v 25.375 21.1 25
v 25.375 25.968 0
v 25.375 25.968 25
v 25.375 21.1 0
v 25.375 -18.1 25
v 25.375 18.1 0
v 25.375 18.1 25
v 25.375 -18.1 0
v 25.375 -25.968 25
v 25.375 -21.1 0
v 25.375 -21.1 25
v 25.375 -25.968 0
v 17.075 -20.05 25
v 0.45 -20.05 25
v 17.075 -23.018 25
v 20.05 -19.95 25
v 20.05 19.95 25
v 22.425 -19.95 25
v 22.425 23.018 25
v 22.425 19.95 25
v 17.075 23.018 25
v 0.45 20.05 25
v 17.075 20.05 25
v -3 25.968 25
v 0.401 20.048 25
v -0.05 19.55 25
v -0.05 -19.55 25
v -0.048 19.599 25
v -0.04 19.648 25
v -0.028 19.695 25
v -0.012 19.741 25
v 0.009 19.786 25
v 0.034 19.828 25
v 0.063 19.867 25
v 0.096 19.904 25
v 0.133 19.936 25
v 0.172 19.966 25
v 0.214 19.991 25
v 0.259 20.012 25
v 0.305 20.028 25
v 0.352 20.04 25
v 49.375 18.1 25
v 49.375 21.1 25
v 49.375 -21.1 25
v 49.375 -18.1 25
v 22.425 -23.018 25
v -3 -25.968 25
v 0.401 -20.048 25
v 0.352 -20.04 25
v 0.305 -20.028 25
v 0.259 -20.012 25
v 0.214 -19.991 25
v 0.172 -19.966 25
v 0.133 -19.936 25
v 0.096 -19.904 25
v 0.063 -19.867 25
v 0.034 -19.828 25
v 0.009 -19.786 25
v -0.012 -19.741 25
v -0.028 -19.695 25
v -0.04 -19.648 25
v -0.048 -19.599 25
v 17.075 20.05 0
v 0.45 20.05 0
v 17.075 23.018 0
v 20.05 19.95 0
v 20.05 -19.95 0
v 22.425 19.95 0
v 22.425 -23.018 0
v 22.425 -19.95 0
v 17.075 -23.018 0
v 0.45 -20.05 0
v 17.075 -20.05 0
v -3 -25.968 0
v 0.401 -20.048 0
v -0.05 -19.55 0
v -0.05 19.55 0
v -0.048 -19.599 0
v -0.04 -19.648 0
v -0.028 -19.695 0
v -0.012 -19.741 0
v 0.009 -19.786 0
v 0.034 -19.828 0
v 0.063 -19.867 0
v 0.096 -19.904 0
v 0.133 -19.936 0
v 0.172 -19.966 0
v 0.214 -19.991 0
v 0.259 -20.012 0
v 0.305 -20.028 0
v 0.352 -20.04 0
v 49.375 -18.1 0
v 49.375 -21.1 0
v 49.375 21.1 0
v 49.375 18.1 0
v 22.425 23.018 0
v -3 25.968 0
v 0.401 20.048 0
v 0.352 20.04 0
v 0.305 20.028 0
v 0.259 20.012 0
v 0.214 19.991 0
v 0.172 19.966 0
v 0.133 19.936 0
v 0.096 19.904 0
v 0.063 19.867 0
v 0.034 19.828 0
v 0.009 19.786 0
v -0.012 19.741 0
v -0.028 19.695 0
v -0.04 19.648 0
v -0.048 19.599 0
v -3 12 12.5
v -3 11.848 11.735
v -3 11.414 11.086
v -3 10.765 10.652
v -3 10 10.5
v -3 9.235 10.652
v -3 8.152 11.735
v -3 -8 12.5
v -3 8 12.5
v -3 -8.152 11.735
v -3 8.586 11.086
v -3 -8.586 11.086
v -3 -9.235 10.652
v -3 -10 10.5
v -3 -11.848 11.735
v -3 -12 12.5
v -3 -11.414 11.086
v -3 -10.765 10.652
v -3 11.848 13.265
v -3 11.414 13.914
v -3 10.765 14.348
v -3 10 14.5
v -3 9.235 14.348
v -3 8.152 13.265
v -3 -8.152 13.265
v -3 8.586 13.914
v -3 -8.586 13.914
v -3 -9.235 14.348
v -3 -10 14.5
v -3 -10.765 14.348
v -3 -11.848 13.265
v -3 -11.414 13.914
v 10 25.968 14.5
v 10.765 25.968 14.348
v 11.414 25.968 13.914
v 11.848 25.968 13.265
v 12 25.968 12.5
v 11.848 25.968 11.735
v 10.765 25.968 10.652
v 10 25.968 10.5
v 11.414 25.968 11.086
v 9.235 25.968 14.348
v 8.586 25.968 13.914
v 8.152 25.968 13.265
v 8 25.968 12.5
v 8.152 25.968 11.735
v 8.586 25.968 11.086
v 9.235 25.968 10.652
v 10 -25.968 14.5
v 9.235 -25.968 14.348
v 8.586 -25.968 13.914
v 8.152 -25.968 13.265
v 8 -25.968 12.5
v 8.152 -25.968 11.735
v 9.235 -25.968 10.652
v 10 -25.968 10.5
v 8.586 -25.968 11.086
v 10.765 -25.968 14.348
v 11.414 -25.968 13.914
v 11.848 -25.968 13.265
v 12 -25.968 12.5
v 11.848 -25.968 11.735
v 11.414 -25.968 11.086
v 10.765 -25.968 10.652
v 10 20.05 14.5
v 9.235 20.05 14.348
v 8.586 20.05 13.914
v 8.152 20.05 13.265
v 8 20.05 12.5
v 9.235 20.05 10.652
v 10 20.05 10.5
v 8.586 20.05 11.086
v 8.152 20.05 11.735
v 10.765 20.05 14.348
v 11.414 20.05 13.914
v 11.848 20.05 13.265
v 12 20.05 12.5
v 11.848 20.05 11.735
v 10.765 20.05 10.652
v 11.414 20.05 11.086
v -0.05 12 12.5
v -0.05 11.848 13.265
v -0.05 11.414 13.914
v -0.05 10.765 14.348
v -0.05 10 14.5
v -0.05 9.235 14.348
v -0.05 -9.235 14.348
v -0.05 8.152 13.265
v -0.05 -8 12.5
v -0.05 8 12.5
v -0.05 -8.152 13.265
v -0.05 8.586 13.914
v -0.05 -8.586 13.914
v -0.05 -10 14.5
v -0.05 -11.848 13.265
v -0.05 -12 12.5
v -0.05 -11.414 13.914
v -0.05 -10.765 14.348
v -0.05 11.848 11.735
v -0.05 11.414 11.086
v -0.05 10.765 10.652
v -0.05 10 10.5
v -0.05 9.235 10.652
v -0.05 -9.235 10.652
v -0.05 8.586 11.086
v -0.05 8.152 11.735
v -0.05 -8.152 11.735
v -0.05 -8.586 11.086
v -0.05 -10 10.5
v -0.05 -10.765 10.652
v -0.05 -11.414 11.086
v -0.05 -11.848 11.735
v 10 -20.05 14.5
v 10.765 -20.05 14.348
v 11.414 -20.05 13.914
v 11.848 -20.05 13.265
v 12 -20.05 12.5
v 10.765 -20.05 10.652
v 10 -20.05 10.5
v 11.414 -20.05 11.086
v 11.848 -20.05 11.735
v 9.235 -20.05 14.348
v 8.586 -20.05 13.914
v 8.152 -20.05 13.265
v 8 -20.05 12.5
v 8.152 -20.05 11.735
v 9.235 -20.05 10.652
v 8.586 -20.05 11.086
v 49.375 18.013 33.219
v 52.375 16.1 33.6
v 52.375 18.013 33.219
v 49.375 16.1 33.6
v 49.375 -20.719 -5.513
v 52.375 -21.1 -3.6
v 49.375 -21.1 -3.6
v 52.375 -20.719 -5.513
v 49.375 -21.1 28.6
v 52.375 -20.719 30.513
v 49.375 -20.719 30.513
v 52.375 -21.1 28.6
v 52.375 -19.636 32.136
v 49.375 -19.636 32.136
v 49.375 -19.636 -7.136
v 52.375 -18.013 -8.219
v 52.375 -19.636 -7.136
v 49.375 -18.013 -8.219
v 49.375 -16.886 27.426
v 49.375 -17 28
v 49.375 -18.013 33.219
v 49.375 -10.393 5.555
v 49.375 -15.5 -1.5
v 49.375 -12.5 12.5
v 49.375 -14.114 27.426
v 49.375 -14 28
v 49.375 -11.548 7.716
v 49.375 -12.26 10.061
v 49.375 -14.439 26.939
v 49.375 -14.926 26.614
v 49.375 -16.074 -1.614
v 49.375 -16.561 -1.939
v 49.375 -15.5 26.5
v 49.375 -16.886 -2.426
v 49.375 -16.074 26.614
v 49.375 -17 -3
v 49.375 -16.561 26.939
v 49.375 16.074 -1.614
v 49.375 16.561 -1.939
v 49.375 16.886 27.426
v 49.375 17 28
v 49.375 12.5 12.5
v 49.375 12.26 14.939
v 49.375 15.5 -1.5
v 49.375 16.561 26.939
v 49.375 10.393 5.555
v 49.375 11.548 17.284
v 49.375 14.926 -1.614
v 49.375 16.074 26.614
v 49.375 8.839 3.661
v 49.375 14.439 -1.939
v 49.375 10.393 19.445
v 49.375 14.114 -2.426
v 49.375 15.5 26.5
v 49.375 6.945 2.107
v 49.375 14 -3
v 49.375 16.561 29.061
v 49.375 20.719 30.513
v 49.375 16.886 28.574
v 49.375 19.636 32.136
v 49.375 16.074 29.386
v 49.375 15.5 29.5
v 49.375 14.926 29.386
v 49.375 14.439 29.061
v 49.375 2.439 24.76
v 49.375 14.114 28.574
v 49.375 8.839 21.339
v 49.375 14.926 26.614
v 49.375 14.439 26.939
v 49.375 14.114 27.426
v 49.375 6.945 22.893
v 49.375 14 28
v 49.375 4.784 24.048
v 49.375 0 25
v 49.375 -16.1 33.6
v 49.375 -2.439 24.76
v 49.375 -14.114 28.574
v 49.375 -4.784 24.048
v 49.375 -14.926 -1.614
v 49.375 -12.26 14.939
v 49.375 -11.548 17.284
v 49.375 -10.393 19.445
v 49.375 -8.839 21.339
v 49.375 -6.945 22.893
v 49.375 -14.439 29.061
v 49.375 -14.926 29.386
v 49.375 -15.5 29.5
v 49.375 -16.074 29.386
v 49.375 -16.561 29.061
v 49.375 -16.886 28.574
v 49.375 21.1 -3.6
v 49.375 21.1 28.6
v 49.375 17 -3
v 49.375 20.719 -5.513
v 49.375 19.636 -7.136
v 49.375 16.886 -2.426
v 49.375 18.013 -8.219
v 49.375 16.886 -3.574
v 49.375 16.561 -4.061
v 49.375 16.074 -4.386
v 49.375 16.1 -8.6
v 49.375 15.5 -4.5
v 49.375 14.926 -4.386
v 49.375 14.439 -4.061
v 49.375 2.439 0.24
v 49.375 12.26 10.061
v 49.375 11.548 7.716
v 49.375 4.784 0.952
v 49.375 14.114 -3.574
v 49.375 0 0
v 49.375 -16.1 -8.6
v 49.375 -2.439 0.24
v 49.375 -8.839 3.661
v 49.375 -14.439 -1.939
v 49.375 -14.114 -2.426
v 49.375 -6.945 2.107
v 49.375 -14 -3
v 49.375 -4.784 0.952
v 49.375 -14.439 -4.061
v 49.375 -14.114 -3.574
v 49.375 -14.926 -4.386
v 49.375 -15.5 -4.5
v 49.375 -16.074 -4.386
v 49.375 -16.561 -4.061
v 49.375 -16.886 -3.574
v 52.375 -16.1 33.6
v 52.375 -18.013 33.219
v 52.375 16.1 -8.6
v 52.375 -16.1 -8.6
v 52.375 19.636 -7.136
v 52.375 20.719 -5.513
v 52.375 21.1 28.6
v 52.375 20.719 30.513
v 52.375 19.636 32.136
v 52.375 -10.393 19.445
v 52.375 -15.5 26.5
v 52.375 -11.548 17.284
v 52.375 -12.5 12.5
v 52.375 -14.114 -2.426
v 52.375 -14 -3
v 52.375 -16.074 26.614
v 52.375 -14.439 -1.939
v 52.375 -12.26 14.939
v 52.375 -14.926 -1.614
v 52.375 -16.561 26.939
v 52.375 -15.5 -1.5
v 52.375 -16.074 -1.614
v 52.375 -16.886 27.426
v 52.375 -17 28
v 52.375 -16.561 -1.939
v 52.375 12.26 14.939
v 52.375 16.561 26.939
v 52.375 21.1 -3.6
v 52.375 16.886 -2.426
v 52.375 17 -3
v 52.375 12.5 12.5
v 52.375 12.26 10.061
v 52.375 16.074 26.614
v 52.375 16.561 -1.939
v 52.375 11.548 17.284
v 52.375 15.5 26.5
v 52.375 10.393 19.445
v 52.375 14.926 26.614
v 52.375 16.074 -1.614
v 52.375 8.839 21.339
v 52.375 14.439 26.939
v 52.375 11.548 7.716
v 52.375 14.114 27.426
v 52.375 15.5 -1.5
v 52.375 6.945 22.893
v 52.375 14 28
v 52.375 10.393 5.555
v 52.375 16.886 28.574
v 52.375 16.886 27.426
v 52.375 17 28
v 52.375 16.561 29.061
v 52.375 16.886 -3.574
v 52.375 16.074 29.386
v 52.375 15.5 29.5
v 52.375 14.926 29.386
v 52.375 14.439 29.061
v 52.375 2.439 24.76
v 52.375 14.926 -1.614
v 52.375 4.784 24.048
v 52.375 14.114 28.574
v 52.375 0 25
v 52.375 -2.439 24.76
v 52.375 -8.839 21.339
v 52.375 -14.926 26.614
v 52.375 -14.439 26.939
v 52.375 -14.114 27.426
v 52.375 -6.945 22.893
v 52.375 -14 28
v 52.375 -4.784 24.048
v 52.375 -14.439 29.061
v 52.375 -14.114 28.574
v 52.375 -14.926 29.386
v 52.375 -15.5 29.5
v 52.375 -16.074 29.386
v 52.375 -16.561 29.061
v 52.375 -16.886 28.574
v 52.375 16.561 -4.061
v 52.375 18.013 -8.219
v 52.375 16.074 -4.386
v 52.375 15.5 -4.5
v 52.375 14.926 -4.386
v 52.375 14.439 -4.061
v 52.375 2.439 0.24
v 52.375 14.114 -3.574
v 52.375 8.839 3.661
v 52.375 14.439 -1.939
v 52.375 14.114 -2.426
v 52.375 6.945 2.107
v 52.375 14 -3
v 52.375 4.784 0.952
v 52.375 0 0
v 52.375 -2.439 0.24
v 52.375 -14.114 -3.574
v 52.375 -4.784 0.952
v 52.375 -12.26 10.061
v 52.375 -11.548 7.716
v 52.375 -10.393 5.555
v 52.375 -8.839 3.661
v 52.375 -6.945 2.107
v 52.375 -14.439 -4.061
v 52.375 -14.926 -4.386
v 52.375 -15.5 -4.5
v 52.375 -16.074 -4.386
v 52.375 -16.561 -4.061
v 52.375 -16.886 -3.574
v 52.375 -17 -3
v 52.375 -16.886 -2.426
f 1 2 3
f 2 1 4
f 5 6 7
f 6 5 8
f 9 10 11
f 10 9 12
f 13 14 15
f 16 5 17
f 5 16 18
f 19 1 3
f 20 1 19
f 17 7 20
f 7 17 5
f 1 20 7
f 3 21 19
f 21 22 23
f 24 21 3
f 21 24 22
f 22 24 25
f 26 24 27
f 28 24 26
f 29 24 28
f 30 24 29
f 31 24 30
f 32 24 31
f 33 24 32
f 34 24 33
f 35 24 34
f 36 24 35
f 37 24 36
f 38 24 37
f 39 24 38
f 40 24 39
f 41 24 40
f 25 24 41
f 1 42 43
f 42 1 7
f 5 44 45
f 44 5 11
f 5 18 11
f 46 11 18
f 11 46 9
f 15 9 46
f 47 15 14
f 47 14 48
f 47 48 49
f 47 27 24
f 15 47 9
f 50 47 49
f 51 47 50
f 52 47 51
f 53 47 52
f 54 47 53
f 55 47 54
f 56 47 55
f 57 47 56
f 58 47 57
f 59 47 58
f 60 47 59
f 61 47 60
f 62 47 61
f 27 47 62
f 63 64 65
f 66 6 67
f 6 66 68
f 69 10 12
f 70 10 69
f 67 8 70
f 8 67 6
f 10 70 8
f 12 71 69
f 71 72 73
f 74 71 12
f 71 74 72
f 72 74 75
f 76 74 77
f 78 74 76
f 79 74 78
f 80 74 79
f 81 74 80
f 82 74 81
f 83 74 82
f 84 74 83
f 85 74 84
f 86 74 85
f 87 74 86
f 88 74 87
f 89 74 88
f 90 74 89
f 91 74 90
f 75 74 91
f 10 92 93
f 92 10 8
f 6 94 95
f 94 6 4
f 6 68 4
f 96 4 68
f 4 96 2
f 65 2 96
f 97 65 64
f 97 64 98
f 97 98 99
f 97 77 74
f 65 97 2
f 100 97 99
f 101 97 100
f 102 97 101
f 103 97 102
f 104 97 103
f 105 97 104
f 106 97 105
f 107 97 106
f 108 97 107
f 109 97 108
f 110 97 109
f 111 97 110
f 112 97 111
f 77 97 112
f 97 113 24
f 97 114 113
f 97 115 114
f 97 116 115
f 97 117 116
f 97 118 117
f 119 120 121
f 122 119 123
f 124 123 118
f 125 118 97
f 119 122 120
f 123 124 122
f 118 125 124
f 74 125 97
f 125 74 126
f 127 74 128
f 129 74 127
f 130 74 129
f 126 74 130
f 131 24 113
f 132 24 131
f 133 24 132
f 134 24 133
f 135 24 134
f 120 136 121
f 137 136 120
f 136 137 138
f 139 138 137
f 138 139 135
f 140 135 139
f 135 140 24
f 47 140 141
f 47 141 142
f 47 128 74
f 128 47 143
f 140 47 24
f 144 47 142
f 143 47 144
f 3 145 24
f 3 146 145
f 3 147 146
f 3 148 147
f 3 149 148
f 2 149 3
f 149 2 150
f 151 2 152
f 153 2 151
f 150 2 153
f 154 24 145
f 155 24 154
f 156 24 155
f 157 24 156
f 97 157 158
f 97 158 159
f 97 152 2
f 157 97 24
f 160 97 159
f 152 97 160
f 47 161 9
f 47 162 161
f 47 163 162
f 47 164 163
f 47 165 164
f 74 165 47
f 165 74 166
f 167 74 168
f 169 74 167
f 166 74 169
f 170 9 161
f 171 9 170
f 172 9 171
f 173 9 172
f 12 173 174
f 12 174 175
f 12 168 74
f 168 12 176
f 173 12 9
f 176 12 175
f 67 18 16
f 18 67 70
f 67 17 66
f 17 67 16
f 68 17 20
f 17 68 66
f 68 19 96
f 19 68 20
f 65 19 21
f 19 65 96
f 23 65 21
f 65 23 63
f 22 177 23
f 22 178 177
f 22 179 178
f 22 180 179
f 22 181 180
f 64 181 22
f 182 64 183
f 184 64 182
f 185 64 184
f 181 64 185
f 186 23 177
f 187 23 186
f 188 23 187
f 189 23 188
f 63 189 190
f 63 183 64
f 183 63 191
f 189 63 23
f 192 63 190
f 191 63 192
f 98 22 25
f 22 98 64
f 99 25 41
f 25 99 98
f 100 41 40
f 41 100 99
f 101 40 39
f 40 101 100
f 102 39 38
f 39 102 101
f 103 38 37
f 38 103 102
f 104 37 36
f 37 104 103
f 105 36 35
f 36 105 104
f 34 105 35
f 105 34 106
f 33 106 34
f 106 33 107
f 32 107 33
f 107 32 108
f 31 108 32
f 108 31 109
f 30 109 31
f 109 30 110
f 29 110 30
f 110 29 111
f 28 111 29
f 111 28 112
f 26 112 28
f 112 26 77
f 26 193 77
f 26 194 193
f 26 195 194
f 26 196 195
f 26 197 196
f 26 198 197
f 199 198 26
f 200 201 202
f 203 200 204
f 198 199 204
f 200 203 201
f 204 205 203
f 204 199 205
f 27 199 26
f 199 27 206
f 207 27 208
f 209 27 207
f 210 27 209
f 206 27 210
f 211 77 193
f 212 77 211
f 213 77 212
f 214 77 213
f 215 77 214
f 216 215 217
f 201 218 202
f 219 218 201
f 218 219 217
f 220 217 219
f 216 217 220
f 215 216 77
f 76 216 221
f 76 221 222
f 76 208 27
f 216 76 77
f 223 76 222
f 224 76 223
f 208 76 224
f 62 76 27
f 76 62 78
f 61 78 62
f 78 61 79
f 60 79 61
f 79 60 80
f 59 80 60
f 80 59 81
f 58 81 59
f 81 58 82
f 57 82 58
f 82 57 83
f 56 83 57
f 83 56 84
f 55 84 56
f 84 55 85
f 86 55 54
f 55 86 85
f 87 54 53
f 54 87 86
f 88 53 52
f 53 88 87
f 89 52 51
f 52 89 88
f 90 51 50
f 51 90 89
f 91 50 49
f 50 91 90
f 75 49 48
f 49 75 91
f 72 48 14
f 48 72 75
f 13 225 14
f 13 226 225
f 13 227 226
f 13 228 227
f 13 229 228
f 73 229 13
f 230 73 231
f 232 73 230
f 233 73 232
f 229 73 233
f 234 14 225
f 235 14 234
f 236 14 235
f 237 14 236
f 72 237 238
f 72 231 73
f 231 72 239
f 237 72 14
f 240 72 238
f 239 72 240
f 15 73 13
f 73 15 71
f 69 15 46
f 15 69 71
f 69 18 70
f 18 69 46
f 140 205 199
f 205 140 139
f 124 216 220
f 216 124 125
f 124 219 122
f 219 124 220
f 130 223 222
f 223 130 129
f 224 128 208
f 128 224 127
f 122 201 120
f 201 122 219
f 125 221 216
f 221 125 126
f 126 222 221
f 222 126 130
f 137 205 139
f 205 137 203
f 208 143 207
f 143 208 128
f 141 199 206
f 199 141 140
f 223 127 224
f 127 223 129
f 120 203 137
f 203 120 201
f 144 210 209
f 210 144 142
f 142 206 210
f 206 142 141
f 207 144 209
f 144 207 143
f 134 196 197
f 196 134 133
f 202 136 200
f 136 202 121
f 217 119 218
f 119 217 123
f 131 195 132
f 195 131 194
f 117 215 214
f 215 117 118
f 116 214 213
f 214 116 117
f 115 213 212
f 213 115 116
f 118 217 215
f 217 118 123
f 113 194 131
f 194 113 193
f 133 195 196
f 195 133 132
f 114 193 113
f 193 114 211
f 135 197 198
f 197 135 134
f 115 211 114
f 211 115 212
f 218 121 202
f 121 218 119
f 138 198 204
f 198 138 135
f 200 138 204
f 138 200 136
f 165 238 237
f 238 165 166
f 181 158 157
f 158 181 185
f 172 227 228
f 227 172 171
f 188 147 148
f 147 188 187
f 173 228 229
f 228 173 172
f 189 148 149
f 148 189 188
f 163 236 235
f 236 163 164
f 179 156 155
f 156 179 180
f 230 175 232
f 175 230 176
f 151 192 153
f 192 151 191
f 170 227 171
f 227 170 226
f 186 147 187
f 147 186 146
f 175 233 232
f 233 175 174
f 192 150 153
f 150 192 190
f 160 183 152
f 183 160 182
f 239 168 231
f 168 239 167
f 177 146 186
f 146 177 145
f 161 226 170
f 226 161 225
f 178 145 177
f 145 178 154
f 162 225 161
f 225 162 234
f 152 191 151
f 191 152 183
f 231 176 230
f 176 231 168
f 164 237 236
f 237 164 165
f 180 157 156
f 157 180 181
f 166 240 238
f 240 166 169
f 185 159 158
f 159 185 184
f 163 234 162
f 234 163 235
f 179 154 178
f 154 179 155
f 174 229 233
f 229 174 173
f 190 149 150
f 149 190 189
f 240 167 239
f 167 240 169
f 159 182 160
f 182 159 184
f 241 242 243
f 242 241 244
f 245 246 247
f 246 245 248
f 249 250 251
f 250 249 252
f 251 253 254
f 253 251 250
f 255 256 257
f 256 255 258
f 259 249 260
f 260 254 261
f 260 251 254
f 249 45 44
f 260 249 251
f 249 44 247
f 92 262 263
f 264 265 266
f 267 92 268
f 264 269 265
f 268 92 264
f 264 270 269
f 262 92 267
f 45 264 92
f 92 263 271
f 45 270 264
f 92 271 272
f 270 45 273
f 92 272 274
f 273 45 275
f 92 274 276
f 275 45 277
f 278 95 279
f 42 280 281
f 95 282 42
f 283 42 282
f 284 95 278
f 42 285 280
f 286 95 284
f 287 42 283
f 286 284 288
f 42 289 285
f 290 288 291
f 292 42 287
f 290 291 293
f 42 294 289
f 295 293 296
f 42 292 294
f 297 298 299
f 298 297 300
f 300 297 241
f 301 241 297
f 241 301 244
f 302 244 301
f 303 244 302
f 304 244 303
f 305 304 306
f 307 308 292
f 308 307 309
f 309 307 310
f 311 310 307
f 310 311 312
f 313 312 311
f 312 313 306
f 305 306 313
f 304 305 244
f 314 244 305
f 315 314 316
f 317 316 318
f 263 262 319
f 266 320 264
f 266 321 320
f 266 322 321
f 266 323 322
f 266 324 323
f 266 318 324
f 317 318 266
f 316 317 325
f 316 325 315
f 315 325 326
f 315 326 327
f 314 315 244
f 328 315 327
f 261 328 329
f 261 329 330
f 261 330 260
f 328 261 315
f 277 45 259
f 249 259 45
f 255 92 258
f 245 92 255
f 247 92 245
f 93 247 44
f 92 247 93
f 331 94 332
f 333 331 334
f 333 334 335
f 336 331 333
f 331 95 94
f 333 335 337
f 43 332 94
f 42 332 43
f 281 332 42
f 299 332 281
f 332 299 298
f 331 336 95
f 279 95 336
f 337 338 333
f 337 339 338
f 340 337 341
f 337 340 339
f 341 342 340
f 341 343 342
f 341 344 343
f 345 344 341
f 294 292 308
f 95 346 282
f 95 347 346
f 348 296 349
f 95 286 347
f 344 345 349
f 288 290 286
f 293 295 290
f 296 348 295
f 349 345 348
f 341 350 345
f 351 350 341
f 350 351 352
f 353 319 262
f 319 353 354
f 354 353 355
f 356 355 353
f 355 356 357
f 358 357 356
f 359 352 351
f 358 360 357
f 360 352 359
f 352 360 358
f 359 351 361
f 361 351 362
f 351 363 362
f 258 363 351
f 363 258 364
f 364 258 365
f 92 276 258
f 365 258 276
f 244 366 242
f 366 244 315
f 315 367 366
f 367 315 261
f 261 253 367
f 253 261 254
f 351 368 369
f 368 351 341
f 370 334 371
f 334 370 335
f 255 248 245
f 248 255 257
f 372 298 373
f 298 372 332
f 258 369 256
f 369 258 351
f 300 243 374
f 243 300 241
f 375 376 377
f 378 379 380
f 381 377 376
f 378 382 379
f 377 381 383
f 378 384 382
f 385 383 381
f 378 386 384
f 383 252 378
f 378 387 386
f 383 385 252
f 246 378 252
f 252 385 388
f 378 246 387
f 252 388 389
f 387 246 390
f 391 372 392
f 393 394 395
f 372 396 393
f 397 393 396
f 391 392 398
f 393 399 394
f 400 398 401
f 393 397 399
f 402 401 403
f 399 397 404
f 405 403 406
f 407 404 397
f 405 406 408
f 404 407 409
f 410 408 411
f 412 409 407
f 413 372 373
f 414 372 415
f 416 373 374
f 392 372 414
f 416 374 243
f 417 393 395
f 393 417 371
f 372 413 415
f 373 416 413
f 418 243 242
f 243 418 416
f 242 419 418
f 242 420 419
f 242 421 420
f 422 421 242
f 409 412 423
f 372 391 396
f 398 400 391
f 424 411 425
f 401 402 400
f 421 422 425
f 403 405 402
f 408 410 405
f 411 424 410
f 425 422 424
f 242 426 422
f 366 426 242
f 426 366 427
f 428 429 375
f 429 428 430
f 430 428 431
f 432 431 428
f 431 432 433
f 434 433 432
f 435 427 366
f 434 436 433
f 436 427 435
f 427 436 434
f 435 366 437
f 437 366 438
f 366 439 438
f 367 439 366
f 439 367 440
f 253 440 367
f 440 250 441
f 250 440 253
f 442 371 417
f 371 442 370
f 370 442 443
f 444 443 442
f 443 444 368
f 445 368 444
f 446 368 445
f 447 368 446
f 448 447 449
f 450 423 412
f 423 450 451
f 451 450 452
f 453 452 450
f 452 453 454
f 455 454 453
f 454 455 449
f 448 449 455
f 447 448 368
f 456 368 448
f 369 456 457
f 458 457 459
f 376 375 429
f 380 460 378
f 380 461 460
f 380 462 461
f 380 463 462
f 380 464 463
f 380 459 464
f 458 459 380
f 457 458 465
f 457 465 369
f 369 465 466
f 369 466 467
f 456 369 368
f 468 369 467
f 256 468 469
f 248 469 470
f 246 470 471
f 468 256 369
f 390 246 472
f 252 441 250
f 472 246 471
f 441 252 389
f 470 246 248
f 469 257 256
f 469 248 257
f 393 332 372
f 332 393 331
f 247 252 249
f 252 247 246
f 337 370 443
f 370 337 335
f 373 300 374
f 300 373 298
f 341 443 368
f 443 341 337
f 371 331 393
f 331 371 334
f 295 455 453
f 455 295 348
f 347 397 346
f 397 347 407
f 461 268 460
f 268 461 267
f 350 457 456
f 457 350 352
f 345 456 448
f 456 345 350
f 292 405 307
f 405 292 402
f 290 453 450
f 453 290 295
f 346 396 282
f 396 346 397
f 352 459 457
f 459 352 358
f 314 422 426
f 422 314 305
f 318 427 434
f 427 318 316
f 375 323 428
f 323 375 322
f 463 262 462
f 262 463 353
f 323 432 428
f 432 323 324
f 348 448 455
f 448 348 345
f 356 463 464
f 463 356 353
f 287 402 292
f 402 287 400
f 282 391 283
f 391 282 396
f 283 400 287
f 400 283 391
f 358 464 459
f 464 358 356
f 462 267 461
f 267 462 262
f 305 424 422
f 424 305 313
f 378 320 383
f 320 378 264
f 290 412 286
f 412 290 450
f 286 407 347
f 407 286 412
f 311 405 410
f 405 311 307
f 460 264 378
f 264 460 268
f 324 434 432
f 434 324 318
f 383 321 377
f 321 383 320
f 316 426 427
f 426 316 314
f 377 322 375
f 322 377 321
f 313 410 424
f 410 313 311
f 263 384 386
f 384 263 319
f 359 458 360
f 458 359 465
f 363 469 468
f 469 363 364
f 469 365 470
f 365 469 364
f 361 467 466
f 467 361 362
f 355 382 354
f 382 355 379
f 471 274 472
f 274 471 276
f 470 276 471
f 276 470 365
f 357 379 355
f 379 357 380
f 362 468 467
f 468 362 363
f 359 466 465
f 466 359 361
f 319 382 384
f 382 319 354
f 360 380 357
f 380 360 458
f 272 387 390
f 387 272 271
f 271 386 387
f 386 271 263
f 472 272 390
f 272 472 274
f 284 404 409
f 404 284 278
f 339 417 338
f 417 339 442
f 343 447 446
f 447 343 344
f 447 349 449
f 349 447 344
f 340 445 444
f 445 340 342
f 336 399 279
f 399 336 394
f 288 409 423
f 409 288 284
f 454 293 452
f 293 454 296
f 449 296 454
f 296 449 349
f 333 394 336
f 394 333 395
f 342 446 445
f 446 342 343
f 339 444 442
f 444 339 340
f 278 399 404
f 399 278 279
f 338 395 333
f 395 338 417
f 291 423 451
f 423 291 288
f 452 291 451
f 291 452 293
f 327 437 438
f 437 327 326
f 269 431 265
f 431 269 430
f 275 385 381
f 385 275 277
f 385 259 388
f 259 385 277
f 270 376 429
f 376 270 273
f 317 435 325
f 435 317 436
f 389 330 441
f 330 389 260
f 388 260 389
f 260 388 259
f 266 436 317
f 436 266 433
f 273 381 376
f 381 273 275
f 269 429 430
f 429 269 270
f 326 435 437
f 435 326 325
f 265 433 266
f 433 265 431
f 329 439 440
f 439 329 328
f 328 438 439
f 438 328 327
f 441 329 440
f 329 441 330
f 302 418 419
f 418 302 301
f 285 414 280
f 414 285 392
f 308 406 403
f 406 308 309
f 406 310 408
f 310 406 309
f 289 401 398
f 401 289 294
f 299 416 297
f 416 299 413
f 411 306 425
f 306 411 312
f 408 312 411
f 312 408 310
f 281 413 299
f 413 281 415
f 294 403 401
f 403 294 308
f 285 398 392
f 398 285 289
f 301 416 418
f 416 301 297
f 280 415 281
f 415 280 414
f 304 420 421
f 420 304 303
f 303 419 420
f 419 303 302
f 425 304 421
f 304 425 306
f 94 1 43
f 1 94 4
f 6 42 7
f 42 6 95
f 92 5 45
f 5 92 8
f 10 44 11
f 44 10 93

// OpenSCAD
// file: ../../conf/printer_config.scad
/**********************************************************************************************************************
 **
 ** conf/printer_config.scad
 **
 ** This file contains the main control variables that determine the size and shape of the printer. Note that in the
 ** actual parts specifications, the constants defined here will only ever be accessed through functions defined in
 ** conf/derived_sizes.scad exclusively to allow for easier adaptation, should the mode of calculation change. 
 **
 ** All sizes in mm. Caution: Little to no cross-checking is implemented. Change values sensibly and one at a time.
 **
 ** This file is NOT to be included by any other file except for conf/derived_sizes.scad.
 **
 **********************************************************************************************************************/

include <constants.scad>

// ===== FRAME RAIL DIMENSIONS ========================================================================================

// The length of the vertical MakerSlide extrusions that make up the rails for the carriages.
FRAME_V_RAIL_HEIGHT = 800;

// The length of the horizontal 20x20 V-Slot extrusions that form the sides of the triangle.
FRAME_H_RAIL_LENGTH = 400;

// ===== WORKING SURFACE (BED) DIMENSIONS =============================================================================

// The thickness of the plate that serves as the heated bed.
BED_THICKNESS = 4;

// The diameter of the plate that serves as the heated bed.
BED_DIAMETER = 300;

// ===== DIMENSIONS OF THE PRINTED FRAME PARTS ========================================================================

// The additional clearance to leave around the MakerSlide extrusion.
MAKERSLIDE_CLEARANCE = 0.05;

// The thickness of the walls outside the extruded parts.
FRAME_PART_WALL_THICKNESS = 3;

// The thickness of the wall that separates the vertical rails from the horizontal extrusions.
FRAME_V_H_RAIL_SEPARATION = 8;

// The depth of the holes that hold the V-Slot extrusions.
FRAME_PART_VSLOT_DEPTH = 30;

// Whether to use a horizontal rail at the base of the printer or not.
FRAME_HORIZONTAL_BASE_RAIL = false;

// The depth of the holes in the foot that hold the MakerSlide extrusions. This is for the foot version that holds
// a horizontal rail.
FRAME_FOOT_RAIL_MAKERSLIDE_DEPTH = 25; 

// The depth of the holes in the foot that hold the MakerSlide extrusions. This is for the foot version that does not
// hold a horizontal rail.
FRAME_FOOT_NORAIL_MAKERSLIDE_DEPTH = 17.5; 

// The size of the screws that can be used to mount the foot to the underlying surface.
FRAME_FOOT_BOTTOM_SCREW_SIZE = M5;

// The height of the bracket that holds the motor. WARNING: Increasing this might make it difficult to 
// turn the screws that hold the motor.
FRAME_MOTOR_BRACKET_HEIGHT = 25;

// The height of the bracket that holds the intermediate level with the working surface (print bed).
FRAME_BED_BRACKET_HEIGHT = 25; 

// The depth of the holes in the head that hold the MakerSlide extrusions.
FRAME_HEAD_MAKERSLIDE_DEPTH = 35; 

// ===== ENCLOSURE DIMENSIONS =========================================================================================

// The material thickness of the solid (back and side) enclosure walls.
ENCLOSURE_SOLID_THICKNESS = 4;

// The gap between the horizontal extrusions and the enclosure side walls.
ENCLOSURE_SIDE_GAP = 40;

// ===== CARRIAGE DIMENSIONS ==========================================================================================

// The thickness of the carriage base plate. A thicker plate will make the carriage stiffer, but cost more
// material to print and take away space from the working area.
CARRIAGE_PLATE_THICKNESS = 6;

// The width of the border around the holes in the carriage base plate that hold the V-Wheels. 
CARRIAGE_PLATE_BORDER_WIDTH = 8;

// The upward angle of the ball holder on the carriage.
CARRIAGE_BALL_HOLDER_ANGLE = 10;

// ===== ARM DIMENSIONS AND PARAMETERS ================================================================================

// The distance between the rods that hold the effector.
ROD_DISTANCE = 65;

// The outer diameter of the rods.
ROD_OUTER_DIAMETER = 6;

// The inner diameter of the rods. Set to 0 if the rods are not hollow.
ROD_INNER_DIAMETER = 4;

// The additional clearance to leave between the rod and the holder.
ROD_CLEARANCE = 0.05;

// The thickness of the outer wall around the rod.
ROD_HOLDER_WALL_THICKNESS = 2;

// The depth of the insets that hold the rods.
ROD_HOLDER_DEPTH = 10;

// The minimum angle of the arms.
ROD_MIN_ANGLE = 18;

// The factor used to round up the rod length.
ROD_ROUND_UP_TO = 5;

// The thickness of the magnet holder arms.
MAGNET_HOLDER_THICKNESS = 5;

// The additional clearance to leave around the magnet holder pin.
MAGNET_CLEARANCE = 0.025;

// ===== EFFECTOR DIMENSIONS AND PARAMETERS ===========================================================================

// The additional distance between the magnets on the effector (not the rod distance - the other one :-)).
// This value is added to the minimum distance determined by the magnet size and wall thickness.
EFFECTOR_BALL_ADDITIONAL_DISTANCE = 15;

// The thickness of the effector plate.
EFFECTOR_THICKNESS = 6;

// ===== OTHER DIMENSIONS AND PARAMETERS ==============================================================================

// The range by which the vertical belt tensioner can be adjusted.
TENSIONER_RANGE = 15;
// file: ../../conf/constants.scad
/**********************************************************************************************************************
 **
 ** conf/constants.scad
 **
 ** This file contains constants and aliases used for the part size definitions.
 **
 **********************************************************************************************************************/

/**
 * The alias names for the rails.
 * A is the "front left" rail, B the "front right" rail, C the back rail.
 * These constants are also used for the sides of the frame and the effector; in this case, side A is the one 
 * opposing rail A.
 */
A = 0;
B = 1;
C = 2;

/**
 * Aliases for metric screw/nut sizes.
 */
M2 = 2;
M3 = 3;
M4 = 4;
M5 = 5;

/** 
 * Aliases for NEMA stepper motors.
 */
NEMA14 = 14;
NEMA17 = 17;
NEMA23 = 23;
// file: ../extrusions/makerslide.scad
/**********************************************************************************************************************
 **
 ** parts/extrusions/makerslide.scad
 **
 ** This file ontains some general functions that provide the dimensions of the profile as well as the modules used 
 ** to import the rendered rails. 
 ** This file is intended to be included by other files down the line.
 **
 **********************************************************************************************************************/

include <../../conf/colors.scad>
include <../../conf/derived_sizes.scad>
include <../../conf/part_sizes.scad>

use <../../bom/bom.scad>

/**
 * Provides the pre-rendered main vertical rail.
 * The extrusion will reach into positive X and Z space while being centered on the Y axis.
 */
module makerslide_vertical_rail() {
	bom_entry(section = "Aluminium Extrusions", 
		      description = "MakerSlide Extrusion", 
		      size = str(vertical_extrusion_length(), " mm"));
	color_extrusion()
		import(file = "makerslide_rail.stl"); 
}

/**
 * Create an object that resembles the outer shell of a MakerSlide extrusion. Usage is similar
 * to makerslide_vertical_rail(length). This is handy to punch a hole into a printed part that will later
 * accomodate the MakerSlide extrusion.
 */
module makerslide_punch(length) {
	color_punch()
		linear_extrude(height = length, center = false, convexity = 10)
			union() {
				hull() {
					// use two circles for the back sides
					_y_offset = makerslide_base_width()/2 - makerslide_edge_radius() + makerslide_clearance();
					translate([makerslide_edge_radius() - makerslide_clearance(), -_y_offset, 0])
						circle(r = makerslide_edge_radius(), $fn = makerslide_edge_resolution());
					translate([makerslide_edge_radius() - makerslide_clearance(), _y_offset, 0])
						circle(r = makerslide_edge_radius(), $fn = makerslide_edge_resolution());
					// use a rectangle to shape the front side
					translate([makerslide_base_depth() - 1 + makerslide_clearance(), 
						       -makerslide_base_width()/2 - makerslide_clearance(), 0])
						square([1, makerslide_base_width() + 2 * makerslide_clearance()]);
				}
				_rail_base_x = makerslide_base_depth() - makerslide_edge_radius() - 
				               makerslide_rail_depth() - makerslide_clearance();
				_rail_offset_y = makerslide_base_width()/2 - makerslide_clearance();
				_rail_punch_width = makerslide_rail_width() + 2 * makerslide_clearance();
				_rail_punch_depth = 2*makerslide_rail_depth() + makerslide_edge_radius() + 2 * makerslide_clearance();
				translate([_rail_base_x, -_rail_offset_y - _rail_punch_width, 0])
					square([_rail_punch_depth, _rail_punch_width]);
				translate([_rail_base_x, _rail_offset_y, 0])
					square([_rail_punch_depth, _rail_punch_width]);

				// previous version:
				// // use the profile itself as the basic shape
				// import(file = "makerslide.dxf"); 
				// // add a rectangle to fill the holes on the left/right (small) sides 
				// // as well as most of the inside of the profile
				// translate([2, -20, 0])
				// 	square([18, 40]);
				// // add a second rectangle to fill the gaps on the back (we want to keep the rounded edges)
				// translate([0, -18, 0])
				// 	square([2, 36]);
				
			}
}
// file: ../../bom/bom.scad
/**********************************************************************************************************************
 **
 ** bom/bom.scad
 **
 ** This file provides the functions to generate a basic bill of materials (BOM) from the model.
 **
 **********************************************************************************************************************/

/**
 * A recursive function to format the parent module hierarchy as a series of delimited sub-strings.
 * Example: "vertical_axis_assembly>_vertical_axis_assembly>makerslide_vertical_rail"
 */
function _bom_parent_list(level, delimiter = ">") = 
	(level < $parent_modules - 1) ? str(_bom_parent_list(level = level + 1), delimiter, parent_module(level)) : "";

module bom_entry(section = "", description = "", size = "", number = 1) {
	// Only perform any actions if WRITE_BOM is set. This is done through the command line - see Makefile.
	if (WRITE_BOM) {
		echo(str("BOM;", section, ";", description, ";", size, ";", number, ";", _bom_parent_list(level = 2)));
	}
}
// file: ../../conf/colors.scad
/**********************************************************************************************************************
 **
 ** conf/colors.scad
 **
 ** This file defines some modules to use symbolic colors throughout the entire project.
 **
 **********************************************************************************************************************/

/**
 * The color of the aluminium extrusions.
 */
module color_extrusion() {
	color("LightGrey")
		children();
} 

/**
 * The color of the cast aluminium parts.
 */
module color_cast_aluminium() {
	color("Silver")
		children();
} 

/**
 * The color of the solid parts of the enclosure.
 */
module color_enclosure_solid() {
	color("BurlyWood")
		children();
} 

/**
 * The color of the "outer" printed frame elements.
 */
module color_printed_outer_frame() {
	color("RoyalBlue")
		children();
} 

/**
 * The color of the "inner" printed frame elements.
 */
module color_printed_inner_frame() {
	color("DodgerBlue")
		children();
} 

/**
 * The color of the printed carriages.
 */
module color_printed_carriage() {
	color("DodgerBlue")
		children();
} 

/**
 * The color of the printed tensioners and end switch brackets.
 */
module color_printed_head_parts() {
	color("PowderBlue")
		children();
} 

/**
 * The color of the magnet holders.
 */
module color_printed_magnet_holders() {
	color("RoyalBlue")
		children();
} 

/**
 * The color of the printed effectors.
 */
module color_printed_effector() {
	color("DodgerBlue")
		children();
} 

/**
 * The color of the stock hardware parts like nuts, bolts and screws.
 */
module color_hardware() {
	color("DarkSlateGray")
		children();
} 

/**
 * The color of the magnets and steel balls.
 */
module color_magnets_balls() {
	color("Silver")
		children();
} 

/**
 * The color of the gears and ball bearings.
 */
module color_gears() {
	color("Gray")
		children();
} 

/**
 * The color of the belts.
 */
module color_belt() {
	color("SaddleBrown")
		children();
} 

/**
 * The color of the stepper motors.
 */
module color_motor() {
	color("DimGray")
		children();
} 

/**
 * The color of the end switches.
 */
module color_switch() {
	color([0.15, 0.15, 0.15])
		children();
} 

/**
 * The color of the V-Wheels.
 */
module color_vwheels() {
	color([0.075, 0.075, 0.075])
		children();
} 

/**
 * The color of the carbon fiber rods for the arms.
 */
module color_rod() {
	color([0.2, 0.2, 0.2])
		children();
} 

/**
 * The color of punches and other objects that are usually not intended to be rendered as such, but rather to be
 * used as subtractive objects.
 */
module color_punch() {
	color("Red")
		children();
} 
// main file
/**********************************************************************************************************************
 **
 ** parts/printed/motor_bracket.scad
 **
 ** This file constructs the bracket that holds the axis stepper motors to the vertical extrusions.
 ** To assemble the printer, you need three of these parts.
 **
 **********************************************************************************************************************/

include <../../conf/colors.scad>
include <../../conf/derived_sizes.scad>
include <../../conf/part_sizes.scad>

use <../../bom/bom.scad>
use <../../parts/extrusions/makerslide.scad>
use <../../parts/vitamins/vitamins.scad>

/**
 * The dimensions of the bracket part that fits onto the MakerSlide extrusion.
 */
function _motor_bracket_outer_height() = motor_bracket_height();
function _motor_bracket_outer_width()  = frame_wall_thickness() + makerslide_width() + frame_wall_thickness();
function _motor_bracket_outer_depth()  = frame_wall_thickness() + makerslide_depth() + frame_wall_thickness();

/**
 * The position of the plate that holds the motor.
 */
function _motor_bracket_plate_x() = makerslide_depth() + vmotor_rail_distance() - frame_wall_thickness();
function _motor_bracket_plate_y() = -vmotor_width() / 2;
function _motor_bracket_plate_z() = -abs((vmotor_height() - motor_bracket_height())) / 2;

function _motor_bracket_plate_screw_dist_y() = (vmotor_width() - vmotor_screw_distance()) / 2;
function _motor_bracket_plate_screw_dist_z() = (vmotor_height() - vmotor_screw_distance()) / 2;

/**
 * Renders a block that can be fixed to the vertical MakerSlide extrusion. 
 * Not to be used outside of this file.
 */
module _motor_bracket_rail_fixture() {
	difference() {
		// a block to hold the MakerSlide extrusion
		translate([-frame_wall_thickness(), -_motor_bracket_outer_width()/2, 0])
			cube([_motor_bracket_outer_depth(), _motor_bracket_outer_width(), _motor_bracket_outer_height()]);
		// minus the hole for the MakerSlide extrusion
		makerslide_punch(_motor_bracket_outer_height());
		// minus the screw holes on the back
		translate([-frame_wall_thickness()/2, -makerslide_slot_offset(), motor_bracket_screw_z_offset()])
			rotate([0, 90, 0])
				cylinder(d = frame_screw_size(), h = 2*frame_wall_thickness(), 
						 center = true, $fn = frame_screw_hole_resolution());
		translate([-frame_wall_thickness()/2, makerslide_slot_offset(), motor_bracket_screw_z_offset()])
			rotate([0, 90, 0])
				cylinder(d = frame_screw_size(), h = 2*frame_wall_thickness(), 
						 center = true, $fn = frame_screw_hole_resolution());
		// minus the screw holes on the side
		translate([makerslide_slot_offset(), 0, motor_bracket_screw_z_offset()])
			rotate([90, 0, 0])
				cylinder(d = frame_screw_size(), h = 2*_motor_bracket_outer_width(), 
						 center = true, $fn = frame_screw_hole_resolution());
	}
}

/**
 * Renders the plate that the motor is fixed to.
 * Not to be used outside of this file.
 */
module _motor_bracket_plate() {
	difference() {
		// the base plate itself 
		hull() {
			translate([0, motor_bracket_edge_radius(), motor_bracket_edge_radius()])
				rotate([0, 90, 0])
					cylinder(r = motor_bracket_edge_radius(), h = frame_wall_thickness(), 
						$fn = motor_bracket_edge_resolution());
			translate([0, vmotor_width() - motor_bracket_edge_radius(), motor_bracket_edge_radius()])
				rotate([0, 90, 0])
					cylinder(r = motor_bracket_edge_radius(), h = frame_wall_thickness(), 
						$fn = motor_bracket_edge_resolution());
			translate([0, motor_bracket_edge_radius(), vmotor_height() - motor_bracket_edge_radius()])
				rotate([0, 90, 0])
					cylinder(r = motor_bracket_edge_radius(), h = frame_wall_thickness(), 
						$fn = motor_bracket_edge_resolution());
			translate([0, vmotor_width() - motor_bracket_edge_radius(), vmotor_height() - motor_bracket_edge_radius()])
				rotate([0, 90, 0])
					cylinder(r = motor_bracket_edge_radius(), h = frame_wall_thickness(), 
						$fn = motor_bracket_edge_resolution());
		}
		// minus the hole in the center 
		translate([0, vmotor_width()/2, vmotor_height()/2])
			rotate([0, 90, 0])
				cylinder(d = vmotor_mounting_hole_diameter(), h = frame_wall_thickness() + 1, // artifact removal
					$fn = vmotor_mounting_hole_resolution());
		// minus the screw holes
		translate([0, _motor_bracket_plate_screw_dist_y(), _motor_bracket_plate_screw_dist_z()])
			rotate([0, 90, 0])
				cylinder(d = vmotor_screw_size(), h = frame_wall_thickness() + 1, // artifact removal
					$fn = frame_screw_hole_resolution());
		translate([0, vmotor_width() - _motor_bracket_plate_screw_dist_y(), _motor_bracket_plate_screw_dist_z()])
			rotate([0, 90, 0])
				cylinder(d = vmotor_screw_size(), h = frame_wall_thickness() + 1, // artifact removal
					$fn = frame_screw_hole_resolution());
		translate([0, _motor_bracket_plate_screw_dist_y(), vmotor_height() - _motor_bracket_plate_screw_dist_z()])
			rotate([0, 90, 0])
				cylinder(d = vmotor_screw_size(), h = frame_wall_thickness() + 1, // artifact removal
					$fn = frame_screw_hole_resolution());
		translate([0, vmotor_width() - _motor_bracket_plate_screw_dist_y(), vmotor_height() - _motor_bracket_plate_screw_dist_z()])
			rotate([0, 90, 0])
				cylinder(d = vmotor_screw_size(), h = frame_wall_thickness() + 1, // artifact removal
					$fn = frame_screw_hole_resolution());

	}
}

/**
 * Renders a solid part that connects the rail fixture and the motor plate.
 * Not to be used outside of this file.
 */
module _motor_bracket_plate_connector() {
	_connector_width  = frame_wall_thickness();
	_connector_height = min(_motor_bracket_outer_height(), vmotor_height() - 2*motor_bracket_edge_radius());
	_connector_depth  = vmotor_rail_distance() - frame_wall_thickness();
	translate([0, -_connector_width/2, 0])
		cube([_connector_depth, _connector_width, _connector_height]);
}

/**
 * Creates the motor bracket assembly by rendering it from scratch. This module is not to be called externally, use 
 * motor_bracket() instead.
 */
module _render_motor_bracket() {
	color_printed_inner_frame()
		render() {
			// add the part of the bracket that is fixed to the vertical axis
			_motor_bracket_rail_fixture();
			// add the plate that will hold the NEMA17 stepper motor
			translate([_motor_bracket_plate_x(), _motor_bracket_plate_y(), _motor_bracket_plate_z()])
				_motor_bracket_plate();
			// add the connectors between the bracket and the plate#
			_connector_x = makerslide_depth() + frame_wall_thickness();
			_connector_offset_y = vmotor_width() / 2 - frame_wall_thickness() / 2;
			translate([_connector_x, _connector_offset_y, 0])
				_motor_bracket_plate_connector();
			translate([_connector_x, -_connector_offset_y, 0])
				_motor_bracket_plate_connector();
		}
}

/**
 * Main module to use the pre-rendered motor bracket . The assembly is centered on the Z axis in Y direction for easier 
 * manipulation, similar to the MakerSlide extrusion. 
 */
module motor_bracket(render = false) {
	bom_entry(section = "Printed Parts", description = "Frame", size = "Motor Bracket");
	color_printed_inner_frame()
		import(file = "motor_bracket.stl");
}

/**
 * Places the stepper motor and - if requested - the pulley in the correct position.
 */
module motor_bracket_stepper(with_pulley = true) {
	translate([makerslide_depth() + vmotor_rail_distance(), 0, motor_bracket_height() / 2]) 
		rotate([0, 0, 180])
			stepper_medium(NEMA17);
	if (with_pulley) {
		translate([makerslide_depth() + vmotor_gt2_pulley_rail_distance(), 0, motor_bracket_height() / 2]) 
			rotate([0, 0, vmotor_gt2_pulley_reversed() ? 0 : 180])
				gt2_pulley_20t_5mm();
	}
}

/** 
 * Renders the hardware (nuts, bolts, screws) that are used to fixed the printed part to the surrounding parts.
 */
module motor_bracket_hardware(vertical_side_screws = true, vertical_back_screws = false) {

	if (vertical_back_screws) {
		// vertical MakerSlide rail -- back 
		translate([-frame_wall_thickness() - epsilon() - washer_thickness(M4),
				   -makerslide_slot_offset(), 
				   motor_bracket_screw_z_offset()]) {
			washer(size = M4);
		}
		translate([-frame_wall_thickness() - epsilon() - washer_thickness(M4) - epsilon(),
				   -makerslide_slot_offset(), 
				   motor_bracket_screw_z_offset()]) {
			screw(size = M4, length = 8);
			nut_tslot(M4);
		}
		translate([-frame_wall_thickness() - epsilon() - washer_thickness(M4),
				   makerslide_slot_offset(), 
				   motor_bracket_screw_z_offset()]) {
			washer(size = M4);
		}
		translate([-frame_wall_thickness() - epsilon() - washer_thickness(M4) - epsilon(), 
			       makerslide_slot_offset(), 
			       motor_bracket_screw_z_offset()]) {
			screw(size = M4, length = 8);
			nut_tslot(M4);
		}
	}

	if (vertical_side_screws) {
		// vertical MakerSlide rail -- sides
		_side_screw_y = makerslide_width() / 2 + frame_wall_thickness() + epsilon();
		translate([makerslide_slot_offset(), _side_screw_y + washer_thickness(M4), motor_bracket_screw_z_offset()]) 
			rotate([0, 0, -90]) {
				washer(size = M4);
			}
		translate([makerslide_slot_offset(), _side_screw_y + washer_thickness(M4) + epsilon(), motor_bracket_screw_z_offset()]) 
			rotate([0, 0, -90]) {
				screw(size = M4, length = 12);
				nut_tslot(M4);
			}
		translate([makerslide_slot_offset(), -_side_screw_y - washer_thickness(M4), motor_bracket_screw_z_offset()]) 
			rotate([0, 0, 90]) {
				washer(size = M4);
			}
		translate([makerslide_slot_offset(), -_side_screw_y - washer_thickness(M4) - epsilon(), motor_bracket_screw_z_offset()]) 
			rotate([0, 0, 90]) {
				screw(size = M4, length = 12);
				nut_tslot(M4);
			}
	}
}

/** 
 * Renders the hardware (nuts, bolts, screws) that are used to fixed the stepper motor to the bracket.
 */
module motor_bracket_stepper_hardware() {
	translate([_motor_bracket_plate_x() - epsilon(), _motor_bracket_plate_y(), _motor_bracket_plate_z()]) {
		// the washers
		translate([-washer_thickness(M3), _motor_bracket_plate_screw_dist_y(), _motor_bracket_plate_screw_dist_z()])
			washer(size = M3);
		translate([-washer_thickness(M3), vmotor_width() - _motor_bracket_plate_screw_dist_y(), _motor_bracket_plate_screw_dist_z()])
			washer(size = M3);
		translate([-washer_thickness(M3), _motor_bracket_plate_screw_dist_y(), vmotor_height() - _motor_bracket_plate_screw_dist_z()])
			washer(size = M3);
		translate([-washer_thickness(M3), vmotor_width() - _motor_bracket_plate_screw_dist_y(), vmotor_height() - _motor_bracket_plate_screw_dist_z()])
			washer(size = M3);

		// the screws
		translate([-washer_thickness(M3) - epsilon(), _motor_bracket_plate_screw_dist_y(), _motor_bracket_plate_screw_dist_z()])
			screw(size = M3, length = 6);
		translate([-washer_thickness(M3) - epsilon(), vmotor_width() - _motor_bracket_plate_screw_dist_y(), _motor_bracket_plate_screw_dist_z()])
			screw(size = M3, length = 6);
		translate([-washer_thickness(M3) - epsilon(), _motor_bracket_plate_screw_dist_y(), vmotor_height() - _motor_bracket_plate_screw_dist_z()])
			screw(size = M3, length = 6);
		translate([-washer_thickness(M3) - epsilon(), vmotor_width() - _motor_bracket_plate_screw_dist_y(), vmotor_height() - _motor_bracket_plate_screw_dist_z()])
			screw(size = M3, length = 6);
	}
}

_render_motor_bracket();
